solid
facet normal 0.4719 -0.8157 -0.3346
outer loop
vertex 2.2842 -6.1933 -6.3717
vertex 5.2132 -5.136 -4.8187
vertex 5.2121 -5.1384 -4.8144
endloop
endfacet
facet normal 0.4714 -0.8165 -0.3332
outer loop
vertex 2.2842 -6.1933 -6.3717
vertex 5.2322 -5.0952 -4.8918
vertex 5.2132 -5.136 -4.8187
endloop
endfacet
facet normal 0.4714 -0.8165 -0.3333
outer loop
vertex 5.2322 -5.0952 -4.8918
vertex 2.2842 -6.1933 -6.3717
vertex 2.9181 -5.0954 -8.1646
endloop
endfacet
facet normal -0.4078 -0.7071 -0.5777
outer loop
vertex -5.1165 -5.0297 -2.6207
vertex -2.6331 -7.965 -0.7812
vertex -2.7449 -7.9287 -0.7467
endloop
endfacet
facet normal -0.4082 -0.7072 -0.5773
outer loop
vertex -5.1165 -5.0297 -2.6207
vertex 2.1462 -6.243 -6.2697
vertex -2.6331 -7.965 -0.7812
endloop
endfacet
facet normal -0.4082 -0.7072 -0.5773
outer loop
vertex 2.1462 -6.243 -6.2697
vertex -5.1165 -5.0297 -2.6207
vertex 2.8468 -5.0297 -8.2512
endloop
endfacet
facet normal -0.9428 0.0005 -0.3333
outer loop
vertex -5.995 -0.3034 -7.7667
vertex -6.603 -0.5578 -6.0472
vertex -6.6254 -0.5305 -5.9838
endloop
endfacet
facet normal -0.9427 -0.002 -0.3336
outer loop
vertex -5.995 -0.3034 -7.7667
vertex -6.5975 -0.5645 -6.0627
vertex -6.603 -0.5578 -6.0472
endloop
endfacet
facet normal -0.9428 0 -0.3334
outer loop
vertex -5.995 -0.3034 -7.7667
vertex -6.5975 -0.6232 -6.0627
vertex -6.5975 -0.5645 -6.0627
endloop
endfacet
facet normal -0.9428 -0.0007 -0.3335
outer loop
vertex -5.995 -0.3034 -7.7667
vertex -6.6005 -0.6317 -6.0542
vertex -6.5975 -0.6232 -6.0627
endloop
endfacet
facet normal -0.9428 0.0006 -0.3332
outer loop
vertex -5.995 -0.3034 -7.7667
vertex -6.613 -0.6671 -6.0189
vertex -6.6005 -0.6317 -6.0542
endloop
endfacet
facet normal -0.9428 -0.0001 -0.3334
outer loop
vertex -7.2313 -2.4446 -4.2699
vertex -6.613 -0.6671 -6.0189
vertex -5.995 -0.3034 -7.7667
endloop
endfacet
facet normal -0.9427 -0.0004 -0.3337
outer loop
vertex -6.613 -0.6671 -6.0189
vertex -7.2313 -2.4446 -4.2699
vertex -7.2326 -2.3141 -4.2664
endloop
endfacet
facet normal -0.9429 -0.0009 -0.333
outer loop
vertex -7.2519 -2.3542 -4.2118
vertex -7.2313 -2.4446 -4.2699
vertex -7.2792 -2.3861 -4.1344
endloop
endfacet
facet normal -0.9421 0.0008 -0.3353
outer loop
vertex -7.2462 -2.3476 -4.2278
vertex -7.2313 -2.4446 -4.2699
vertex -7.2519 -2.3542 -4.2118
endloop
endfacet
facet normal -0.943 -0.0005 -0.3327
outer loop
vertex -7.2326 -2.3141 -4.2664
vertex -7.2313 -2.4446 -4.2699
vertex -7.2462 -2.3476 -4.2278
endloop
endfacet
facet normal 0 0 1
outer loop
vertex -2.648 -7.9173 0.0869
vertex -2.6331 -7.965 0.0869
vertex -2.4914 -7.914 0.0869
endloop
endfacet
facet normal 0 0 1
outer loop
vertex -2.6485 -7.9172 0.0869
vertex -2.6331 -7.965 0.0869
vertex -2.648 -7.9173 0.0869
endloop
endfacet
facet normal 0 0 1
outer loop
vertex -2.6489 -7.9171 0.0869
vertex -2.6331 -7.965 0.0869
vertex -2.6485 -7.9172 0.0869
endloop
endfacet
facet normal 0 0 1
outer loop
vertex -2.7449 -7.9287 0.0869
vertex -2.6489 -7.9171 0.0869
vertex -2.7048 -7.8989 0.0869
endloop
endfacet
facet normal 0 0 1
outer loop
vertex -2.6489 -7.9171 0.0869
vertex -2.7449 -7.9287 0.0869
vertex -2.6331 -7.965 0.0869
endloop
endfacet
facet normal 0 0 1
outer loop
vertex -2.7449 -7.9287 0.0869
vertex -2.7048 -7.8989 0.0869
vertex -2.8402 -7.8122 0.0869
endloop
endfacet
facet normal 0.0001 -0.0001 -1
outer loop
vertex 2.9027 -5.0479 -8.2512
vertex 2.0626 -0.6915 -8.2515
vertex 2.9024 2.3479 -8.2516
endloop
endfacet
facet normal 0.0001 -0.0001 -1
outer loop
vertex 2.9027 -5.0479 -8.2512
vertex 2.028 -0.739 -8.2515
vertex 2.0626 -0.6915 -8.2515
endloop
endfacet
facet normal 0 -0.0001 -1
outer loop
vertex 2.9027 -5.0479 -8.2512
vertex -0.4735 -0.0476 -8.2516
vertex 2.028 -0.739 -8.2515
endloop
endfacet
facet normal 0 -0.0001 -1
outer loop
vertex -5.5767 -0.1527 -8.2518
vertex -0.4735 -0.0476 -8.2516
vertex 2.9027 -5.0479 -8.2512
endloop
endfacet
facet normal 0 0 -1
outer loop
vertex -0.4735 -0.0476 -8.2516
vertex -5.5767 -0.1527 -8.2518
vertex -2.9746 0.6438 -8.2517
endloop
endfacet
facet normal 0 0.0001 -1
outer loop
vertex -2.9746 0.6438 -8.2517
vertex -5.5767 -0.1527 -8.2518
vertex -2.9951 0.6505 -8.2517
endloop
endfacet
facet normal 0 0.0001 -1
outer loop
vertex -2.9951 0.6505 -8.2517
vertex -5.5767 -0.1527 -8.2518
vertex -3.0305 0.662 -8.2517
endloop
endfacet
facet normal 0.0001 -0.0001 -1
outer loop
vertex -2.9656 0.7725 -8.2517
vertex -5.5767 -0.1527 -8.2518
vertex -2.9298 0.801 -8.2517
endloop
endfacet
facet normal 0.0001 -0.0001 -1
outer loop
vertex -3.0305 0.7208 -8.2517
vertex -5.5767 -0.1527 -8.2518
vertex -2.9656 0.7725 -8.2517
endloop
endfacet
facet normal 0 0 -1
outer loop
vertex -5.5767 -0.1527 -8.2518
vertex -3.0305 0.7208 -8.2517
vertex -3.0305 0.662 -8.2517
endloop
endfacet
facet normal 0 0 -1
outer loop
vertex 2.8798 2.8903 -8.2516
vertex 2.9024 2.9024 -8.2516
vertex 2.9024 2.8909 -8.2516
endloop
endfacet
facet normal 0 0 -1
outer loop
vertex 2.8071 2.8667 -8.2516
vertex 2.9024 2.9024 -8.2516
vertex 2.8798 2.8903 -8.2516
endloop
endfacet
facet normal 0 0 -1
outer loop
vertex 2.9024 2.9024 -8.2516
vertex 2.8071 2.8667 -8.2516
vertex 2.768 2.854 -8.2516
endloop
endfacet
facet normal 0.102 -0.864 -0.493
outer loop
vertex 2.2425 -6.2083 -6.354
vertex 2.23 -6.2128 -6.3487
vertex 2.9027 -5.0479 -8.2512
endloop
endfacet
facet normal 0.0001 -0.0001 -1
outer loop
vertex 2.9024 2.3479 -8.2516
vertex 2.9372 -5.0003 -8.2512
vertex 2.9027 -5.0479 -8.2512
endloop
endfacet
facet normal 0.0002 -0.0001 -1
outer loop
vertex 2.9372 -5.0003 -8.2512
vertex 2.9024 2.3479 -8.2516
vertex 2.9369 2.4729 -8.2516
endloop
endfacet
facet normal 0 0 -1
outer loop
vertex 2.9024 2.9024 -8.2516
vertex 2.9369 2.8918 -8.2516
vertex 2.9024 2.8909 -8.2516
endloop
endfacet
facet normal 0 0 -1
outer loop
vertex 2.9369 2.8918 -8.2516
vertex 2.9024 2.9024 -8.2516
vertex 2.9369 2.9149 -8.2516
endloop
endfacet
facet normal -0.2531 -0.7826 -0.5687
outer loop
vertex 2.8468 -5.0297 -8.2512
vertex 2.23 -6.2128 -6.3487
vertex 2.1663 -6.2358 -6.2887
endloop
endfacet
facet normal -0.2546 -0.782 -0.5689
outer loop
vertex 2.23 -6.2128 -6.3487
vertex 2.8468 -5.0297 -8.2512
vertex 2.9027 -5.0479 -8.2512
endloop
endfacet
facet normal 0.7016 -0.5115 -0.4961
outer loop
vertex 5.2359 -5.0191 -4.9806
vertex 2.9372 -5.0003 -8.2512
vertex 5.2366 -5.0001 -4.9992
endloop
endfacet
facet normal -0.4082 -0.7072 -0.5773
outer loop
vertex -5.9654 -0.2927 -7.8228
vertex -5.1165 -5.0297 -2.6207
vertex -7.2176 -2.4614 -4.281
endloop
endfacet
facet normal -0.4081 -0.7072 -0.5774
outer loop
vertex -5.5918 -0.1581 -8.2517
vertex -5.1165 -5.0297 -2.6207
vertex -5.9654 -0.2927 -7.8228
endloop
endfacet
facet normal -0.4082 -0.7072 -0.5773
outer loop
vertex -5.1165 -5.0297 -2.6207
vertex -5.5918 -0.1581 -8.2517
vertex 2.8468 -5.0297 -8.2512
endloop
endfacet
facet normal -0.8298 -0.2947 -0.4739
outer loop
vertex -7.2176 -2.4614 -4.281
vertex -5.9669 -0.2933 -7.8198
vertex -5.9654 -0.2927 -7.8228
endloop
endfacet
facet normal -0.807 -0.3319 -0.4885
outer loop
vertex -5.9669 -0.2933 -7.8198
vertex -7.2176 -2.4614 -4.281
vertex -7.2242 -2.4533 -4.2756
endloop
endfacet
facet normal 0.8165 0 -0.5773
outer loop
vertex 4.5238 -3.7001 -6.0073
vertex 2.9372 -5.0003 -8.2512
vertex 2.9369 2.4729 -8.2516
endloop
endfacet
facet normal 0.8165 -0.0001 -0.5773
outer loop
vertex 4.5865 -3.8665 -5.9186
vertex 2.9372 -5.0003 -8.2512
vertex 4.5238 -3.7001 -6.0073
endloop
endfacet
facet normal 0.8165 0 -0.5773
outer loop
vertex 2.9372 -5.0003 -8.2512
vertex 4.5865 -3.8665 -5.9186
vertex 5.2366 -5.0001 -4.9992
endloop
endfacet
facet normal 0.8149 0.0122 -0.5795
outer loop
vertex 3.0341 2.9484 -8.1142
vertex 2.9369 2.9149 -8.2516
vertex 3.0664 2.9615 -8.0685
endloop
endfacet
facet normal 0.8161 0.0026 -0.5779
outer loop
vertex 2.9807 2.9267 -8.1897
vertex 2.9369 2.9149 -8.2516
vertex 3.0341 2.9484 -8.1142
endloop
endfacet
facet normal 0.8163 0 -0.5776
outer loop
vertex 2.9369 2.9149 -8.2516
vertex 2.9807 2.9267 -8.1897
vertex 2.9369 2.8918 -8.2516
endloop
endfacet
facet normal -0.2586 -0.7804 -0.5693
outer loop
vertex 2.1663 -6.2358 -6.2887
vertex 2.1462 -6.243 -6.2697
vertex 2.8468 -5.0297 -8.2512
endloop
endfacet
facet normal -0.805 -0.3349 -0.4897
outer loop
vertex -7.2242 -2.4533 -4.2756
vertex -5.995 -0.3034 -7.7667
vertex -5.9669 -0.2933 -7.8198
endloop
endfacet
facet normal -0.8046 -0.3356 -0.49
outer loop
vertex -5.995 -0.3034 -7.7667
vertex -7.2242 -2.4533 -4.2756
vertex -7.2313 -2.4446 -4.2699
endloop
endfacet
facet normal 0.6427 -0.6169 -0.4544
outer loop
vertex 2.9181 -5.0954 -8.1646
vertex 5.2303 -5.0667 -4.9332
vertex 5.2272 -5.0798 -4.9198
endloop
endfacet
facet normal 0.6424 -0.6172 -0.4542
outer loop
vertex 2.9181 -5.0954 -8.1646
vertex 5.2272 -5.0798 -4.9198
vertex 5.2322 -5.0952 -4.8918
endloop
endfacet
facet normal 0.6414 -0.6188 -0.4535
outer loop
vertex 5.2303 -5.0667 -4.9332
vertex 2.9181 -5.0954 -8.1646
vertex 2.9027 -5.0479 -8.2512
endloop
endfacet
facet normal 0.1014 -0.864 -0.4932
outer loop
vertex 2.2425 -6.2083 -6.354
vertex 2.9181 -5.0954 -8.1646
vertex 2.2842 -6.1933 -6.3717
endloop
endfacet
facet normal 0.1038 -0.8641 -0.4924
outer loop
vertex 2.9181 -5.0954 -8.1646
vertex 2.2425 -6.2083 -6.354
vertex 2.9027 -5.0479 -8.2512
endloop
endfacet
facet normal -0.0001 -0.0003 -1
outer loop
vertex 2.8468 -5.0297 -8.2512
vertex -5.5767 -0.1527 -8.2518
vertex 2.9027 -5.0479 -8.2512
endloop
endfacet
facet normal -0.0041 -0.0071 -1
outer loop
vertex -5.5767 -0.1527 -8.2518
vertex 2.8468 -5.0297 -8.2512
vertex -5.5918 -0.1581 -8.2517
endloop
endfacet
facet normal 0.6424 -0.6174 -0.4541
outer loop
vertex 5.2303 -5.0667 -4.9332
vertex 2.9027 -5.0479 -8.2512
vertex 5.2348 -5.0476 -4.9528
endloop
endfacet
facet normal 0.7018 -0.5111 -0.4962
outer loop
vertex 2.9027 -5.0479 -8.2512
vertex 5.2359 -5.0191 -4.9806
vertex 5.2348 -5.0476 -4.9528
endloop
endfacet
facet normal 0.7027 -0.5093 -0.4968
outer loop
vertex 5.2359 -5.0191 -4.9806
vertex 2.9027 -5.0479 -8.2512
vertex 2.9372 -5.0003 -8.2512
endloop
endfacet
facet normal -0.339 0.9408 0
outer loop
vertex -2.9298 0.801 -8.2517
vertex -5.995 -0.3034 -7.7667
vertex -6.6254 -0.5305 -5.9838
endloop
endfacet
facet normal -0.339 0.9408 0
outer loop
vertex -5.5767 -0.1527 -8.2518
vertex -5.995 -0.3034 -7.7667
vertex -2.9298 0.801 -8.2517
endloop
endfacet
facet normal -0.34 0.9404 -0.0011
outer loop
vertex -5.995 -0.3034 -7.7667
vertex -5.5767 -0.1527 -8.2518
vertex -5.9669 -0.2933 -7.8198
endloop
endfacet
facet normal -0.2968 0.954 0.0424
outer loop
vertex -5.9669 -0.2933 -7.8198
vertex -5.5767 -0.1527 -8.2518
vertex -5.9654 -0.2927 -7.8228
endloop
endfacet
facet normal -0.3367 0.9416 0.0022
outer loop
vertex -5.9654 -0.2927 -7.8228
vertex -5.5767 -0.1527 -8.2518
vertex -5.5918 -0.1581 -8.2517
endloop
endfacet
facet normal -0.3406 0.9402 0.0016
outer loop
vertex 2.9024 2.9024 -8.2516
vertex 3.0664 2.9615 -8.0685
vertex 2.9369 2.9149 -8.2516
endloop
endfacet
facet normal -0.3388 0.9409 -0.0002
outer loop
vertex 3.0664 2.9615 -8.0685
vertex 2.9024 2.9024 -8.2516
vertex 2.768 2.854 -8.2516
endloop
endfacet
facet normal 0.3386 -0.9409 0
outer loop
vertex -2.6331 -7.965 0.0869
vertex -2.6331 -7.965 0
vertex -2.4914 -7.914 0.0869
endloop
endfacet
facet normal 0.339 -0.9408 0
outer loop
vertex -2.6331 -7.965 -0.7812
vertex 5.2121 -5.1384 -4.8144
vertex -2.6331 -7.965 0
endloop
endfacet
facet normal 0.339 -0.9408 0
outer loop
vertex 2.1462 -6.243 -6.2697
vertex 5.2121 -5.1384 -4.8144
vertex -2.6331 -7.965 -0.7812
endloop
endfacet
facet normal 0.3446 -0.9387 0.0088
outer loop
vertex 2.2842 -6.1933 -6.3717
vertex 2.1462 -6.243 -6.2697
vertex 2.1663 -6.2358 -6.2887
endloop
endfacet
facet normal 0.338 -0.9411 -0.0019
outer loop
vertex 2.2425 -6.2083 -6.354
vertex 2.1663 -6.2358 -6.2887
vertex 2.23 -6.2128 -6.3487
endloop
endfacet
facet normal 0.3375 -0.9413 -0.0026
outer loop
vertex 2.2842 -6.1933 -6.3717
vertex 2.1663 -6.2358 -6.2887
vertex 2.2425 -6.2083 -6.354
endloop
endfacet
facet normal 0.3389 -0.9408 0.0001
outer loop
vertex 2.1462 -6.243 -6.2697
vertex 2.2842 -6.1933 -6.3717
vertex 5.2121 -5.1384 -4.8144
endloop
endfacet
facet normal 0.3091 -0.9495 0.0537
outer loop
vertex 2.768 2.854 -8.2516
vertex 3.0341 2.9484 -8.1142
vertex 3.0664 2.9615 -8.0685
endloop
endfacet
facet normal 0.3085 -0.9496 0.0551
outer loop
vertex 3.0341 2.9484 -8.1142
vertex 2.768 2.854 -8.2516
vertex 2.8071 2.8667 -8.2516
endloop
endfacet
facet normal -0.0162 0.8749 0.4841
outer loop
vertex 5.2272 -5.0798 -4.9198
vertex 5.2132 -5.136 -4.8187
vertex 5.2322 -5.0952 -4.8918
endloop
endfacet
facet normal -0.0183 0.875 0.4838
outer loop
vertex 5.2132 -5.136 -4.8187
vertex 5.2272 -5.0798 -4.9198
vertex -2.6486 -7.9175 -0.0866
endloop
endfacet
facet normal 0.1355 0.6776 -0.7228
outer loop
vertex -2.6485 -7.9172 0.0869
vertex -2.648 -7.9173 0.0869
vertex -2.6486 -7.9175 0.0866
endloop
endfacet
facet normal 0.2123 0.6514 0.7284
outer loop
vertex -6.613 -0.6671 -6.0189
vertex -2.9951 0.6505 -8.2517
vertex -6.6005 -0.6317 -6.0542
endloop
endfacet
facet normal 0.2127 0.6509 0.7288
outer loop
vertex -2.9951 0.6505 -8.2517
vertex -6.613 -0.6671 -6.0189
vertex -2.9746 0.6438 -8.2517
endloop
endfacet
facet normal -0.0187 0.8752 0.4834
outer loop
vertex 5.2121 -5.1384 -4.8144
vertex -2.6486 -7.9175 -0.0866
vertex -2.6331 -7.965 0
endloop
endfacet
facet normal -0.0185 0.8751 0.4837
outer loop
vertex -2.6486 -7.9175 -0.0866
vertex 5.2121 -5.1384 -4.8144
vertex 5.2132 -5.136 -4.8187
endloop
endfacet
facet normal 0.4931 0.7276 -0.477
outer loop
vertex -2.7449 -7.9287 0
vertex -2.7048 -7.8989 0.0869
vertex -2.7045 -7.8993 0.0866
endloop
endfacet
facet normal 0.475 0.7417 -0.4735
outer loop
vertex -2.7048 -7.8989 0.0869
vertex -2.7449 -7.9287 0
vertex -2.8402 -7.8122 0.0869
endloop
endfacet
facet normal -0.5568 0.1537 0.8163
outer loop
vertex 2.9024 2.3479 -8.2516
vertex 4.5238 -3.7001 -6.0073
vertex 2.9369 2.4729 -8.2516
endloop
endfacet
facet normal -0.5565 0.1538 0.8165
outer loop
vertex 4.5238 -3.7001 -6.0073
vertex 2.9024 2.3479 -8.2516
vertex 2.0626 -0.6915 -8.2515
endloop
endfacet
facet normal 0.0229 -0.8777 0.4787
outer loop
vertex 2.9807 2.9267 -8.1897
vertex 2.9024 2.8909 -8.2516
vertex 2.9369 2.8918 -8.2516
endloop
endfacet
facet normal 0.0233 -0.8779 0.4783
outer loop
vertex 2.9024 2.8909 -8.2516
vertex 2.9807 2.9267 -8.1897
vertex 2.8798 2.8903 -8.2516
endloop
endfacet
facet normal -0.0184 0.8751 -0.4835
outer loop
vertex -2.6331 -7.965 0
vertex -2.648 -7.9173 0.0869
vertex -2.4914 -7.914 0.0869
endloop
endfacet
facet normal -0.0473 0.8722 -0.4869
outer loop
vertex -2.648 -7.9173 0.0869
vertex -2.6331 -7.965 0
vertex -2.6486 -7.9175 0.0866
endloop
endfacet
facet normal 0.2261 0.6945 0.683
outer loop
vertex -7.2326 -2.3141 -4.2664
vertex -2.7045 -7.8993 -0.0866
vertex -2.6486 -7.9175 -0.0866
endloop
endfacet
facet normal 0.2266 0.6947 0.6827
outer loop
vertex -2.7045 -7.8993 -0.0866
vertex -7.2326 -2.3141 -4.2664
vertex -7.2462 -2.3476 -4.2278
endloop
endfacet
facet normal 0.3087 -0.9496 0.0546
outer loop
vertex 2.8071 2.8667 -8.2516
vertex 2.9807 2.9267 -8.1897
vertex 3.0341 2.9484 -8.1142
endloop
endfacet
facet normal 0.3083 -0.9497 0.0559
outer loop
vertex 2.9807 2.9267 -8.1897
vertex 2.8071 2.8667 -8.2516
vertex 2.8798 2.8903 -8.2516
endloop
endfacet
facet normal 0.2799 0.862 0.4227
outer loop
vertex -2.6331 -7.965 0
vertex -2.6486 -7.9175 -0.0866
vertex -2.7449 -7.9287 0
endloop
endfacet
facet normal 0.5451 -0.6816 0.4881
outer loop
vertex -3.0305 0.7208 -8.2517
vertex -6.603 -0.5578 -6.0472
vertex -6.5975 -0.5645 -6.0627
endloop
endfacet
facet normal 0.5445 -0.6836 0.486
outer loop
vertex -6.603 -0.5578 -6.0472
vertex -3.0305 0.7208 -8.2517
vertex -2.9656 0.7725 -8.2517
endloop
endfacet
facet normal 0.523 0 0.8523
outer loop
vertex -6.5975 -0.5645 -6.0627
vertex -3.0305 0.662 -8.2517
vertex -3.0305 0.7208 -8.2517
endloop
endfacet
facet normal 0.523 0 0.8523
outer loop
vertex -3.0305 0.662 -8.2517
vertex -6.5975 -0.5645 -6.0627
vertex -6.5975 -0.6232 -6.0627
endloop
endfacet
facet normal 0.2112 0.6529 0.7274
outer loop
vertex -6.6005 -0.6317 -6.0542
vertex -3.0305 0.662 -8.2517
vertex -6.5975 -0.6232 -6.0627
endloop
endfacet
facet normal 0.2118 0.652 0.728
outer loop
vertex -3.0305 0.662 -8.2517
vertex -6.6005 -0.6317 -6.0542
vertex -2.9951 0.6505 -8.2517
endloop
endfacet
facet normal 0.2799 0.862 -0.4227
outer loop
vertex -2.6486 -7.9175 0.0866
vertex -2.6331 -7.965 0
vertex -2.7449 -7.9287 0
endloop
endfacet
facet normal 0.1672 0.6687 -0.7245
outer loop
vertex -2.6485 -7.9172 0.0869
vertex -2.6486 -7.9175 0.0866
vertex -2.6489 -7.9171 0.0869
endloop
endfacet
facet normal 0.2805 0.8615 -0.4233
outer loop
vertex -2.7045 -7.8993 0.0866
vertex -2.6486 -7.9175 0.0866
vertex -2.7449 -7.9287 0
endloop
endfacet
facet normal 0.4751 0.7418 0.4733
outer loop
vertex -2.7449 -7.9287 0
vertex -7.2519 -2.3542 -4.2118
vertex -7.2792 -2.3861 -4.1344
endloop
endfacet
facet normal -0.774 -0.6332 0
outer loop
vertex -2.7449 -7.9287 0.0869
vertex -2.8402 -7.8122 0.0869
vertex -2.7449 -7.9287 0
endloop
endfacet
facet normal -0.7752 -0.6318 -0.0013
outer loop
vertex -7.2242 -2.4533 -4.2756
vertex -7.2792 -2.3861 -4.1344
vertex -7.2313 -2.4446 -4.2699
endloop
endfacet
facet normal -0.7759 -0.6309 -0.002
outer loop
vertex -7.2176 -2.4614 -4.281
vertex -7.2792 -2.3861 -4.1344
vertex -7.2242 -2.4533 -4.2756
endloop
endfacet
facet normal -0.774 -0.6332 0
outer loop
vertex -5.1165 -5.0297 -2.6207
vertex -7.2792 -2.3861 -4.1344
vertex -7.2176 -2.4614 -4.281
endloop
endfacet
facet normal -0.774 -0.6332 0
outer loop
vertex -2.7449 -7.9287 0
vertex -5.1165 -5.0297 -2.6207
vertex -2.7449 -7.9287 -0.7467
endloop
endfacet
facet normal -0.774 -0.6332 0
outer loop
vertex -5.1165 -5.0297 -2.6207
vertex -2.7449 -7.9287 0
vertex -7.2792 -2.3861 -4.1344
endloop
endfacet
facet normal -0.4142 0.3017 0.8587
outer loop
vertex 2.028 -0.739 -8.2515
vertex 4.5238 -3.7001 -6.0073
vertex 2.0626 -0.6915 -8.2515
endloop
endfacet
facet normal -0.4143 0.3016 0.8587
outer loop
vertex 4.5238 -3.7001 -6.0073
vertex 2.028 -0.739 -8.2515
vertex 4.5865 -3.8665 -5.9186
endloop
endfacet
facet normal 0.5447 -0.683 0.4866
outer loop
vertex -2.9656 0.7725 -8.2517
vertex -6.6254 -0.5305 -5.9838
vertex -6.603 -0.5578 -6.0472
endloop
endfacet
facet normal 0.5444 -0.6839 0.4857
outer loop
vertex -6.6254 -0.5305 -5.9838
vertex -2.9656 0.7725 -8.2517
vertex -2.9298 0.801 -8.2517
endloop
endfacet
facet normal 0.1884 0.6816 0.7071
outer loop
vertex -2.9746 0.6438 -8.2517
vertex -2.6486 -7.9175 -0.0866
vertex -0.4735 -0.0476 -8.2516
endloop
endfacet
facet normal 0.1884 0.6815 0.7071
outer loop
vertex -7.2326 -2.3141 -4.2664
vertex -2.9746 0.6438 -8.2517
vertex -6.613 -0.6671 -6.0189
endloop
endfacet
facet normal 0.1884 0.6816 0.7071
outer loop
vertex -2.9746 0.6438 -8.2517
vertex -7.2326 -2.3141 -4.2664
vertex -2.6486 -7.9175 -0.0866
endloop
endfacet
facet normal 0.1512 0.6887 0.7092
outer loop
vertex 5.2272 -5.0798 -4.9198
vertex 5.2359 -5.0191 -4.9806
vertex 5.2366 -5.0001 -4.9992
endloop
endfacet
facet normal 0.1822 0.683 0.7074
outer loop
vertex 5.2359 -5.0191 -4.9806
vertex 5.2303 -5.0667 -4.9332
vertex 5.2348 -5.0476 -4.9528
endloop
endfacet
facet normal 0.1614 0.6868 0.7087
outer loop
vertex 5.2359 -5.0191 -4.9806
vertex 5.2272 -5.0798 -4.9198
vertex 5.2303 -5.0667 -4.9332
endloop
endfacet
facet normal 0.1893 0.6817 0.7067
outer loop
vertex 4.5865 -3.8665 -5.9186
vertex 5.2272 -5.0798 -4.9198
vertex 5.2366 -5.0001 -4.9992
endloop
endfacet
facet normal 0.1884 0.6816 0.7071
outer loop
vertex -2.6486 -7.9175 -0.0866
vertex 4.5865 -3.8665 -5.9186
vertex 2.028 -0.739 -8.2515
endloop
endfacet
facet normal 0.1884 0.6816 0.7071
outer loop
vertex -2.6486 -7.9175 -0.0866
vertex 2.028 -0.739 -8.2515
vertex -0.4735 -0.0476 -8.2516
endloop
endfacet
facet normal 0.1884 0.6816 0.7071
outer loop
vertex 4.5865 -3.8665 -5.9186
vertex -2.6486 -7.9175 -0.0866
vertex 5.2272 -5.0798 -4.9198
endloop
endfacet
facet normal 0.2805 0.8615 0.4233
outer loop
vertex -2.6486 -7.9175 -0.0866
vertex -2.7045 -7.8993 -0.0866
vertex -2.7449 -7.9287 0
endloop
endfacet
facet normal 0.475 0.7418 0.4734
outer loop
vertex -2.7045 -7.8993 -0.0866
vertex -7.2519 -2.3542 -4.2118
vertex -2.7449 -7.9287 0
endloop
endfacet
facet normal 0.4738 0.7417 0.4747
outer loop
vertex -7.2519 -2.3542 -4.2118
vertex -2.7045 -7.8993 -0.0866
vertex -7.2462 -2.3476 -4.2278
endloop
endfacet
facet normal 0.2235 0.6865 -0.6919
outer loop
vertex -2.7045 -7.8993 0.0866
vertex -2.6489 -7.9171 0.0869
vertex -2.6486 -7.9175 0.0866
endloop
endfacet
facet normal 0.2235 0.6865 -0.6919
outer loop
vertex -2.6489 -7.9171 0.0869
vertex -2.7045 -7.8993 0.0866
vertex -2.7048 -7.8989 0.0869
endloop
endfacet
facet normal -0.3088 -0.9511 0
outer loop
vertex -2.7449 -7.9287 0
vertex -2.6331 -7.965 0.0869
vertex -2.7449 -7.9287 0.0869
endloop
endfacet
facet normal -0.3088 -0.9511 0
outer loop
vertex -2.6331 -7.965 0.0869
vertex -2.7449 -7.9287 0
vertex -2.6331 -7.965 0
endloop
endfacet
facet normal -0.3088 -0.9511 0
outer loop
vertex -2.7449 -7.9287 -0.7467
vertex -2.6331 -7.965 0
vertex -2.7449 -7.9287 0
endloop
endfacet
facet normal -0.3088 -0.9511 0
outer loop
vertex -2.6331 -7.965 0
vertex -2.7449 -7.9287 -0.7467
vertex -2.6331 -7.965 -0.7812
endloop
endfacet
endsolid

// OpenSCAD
// Auto-generated OpenSCAD file

    inner_points = 10*[[0.5483513328711939, -0.49343059621073404, 0.5000000000001427], [-0.8147584849794822, -0.1166924584026583, 0.5000000000000114], [0.8147454248469246, 0.4704335994932656, -0.5000000000000114], [-0.2664006220419612, -0.7869936251588691, 1.539879335155092e-13], [-6.530066327234646e-06, 0.17687057054547678, 1.0], [-6.5300662304823955e-06, 0.1768705705451305, -1.0], [0.5483513328712422, -0.4934305962109071, -0.4999999999998575], [-0.8147584849794339, -0.11669245840283138, -0.4999999999999886], [0.8147454248468763, 0.47043359949343866, 0.4999999999999886]];

    outer_points = 10*[[0.2886841223116632, 0.4999680237807507, -0.8165129838048599], [0.8660438627157157, -0.4999680237807507, 5.5219683157359256e-05], [-0.8660438627157157, 0.4999680237807507, -5.5219683157359256e-05], [0.2887210423333781, -0.5000319741744229, -0.8164607672859469], [0.8660069426940007, 0.5000319741744229, 3.0031642442862605e-06], [-0.8660069426940007, -0.5000319741744229, -3.0031642442862605e-06], [-0.5773228203823376, -6.395039367218525e-05, -0.8165159869691043], [3.692002171488182e-05, -0.9999999979551737, 5.221651891308081e-05], [-3.692002171488182e-05, 0.9999999979551737, -5.221651891308081e-05]];

    // Convex hull for inner set (I)
    module inner_hull() {
        hull() {
            for (p = inner_points) {
                translate(p) sphere(r=0.1);
            }
        }
    }

    // Convex hull for outer set (O) minus inner hull (O \ I)
    module outer_minus_inner() {
        difference() {
            hull() {
                for (p = outer_points) {
                    translate(p) sphere(r=0.1);
                }
            }
            inner_hull(); // Subtract inner hull
        }
    }

    // Convex hull for outer set (O) minus all translated inner hulls
    module outer_minus_AllTranslationInner() {
        difference() {
            hull() {
                for (p = outer_points) {
                    translate(p) sphere(r=0.1);
                }
            }
            hull() {
                translate([0,0,50]) inner_hull();
                translate([0,0,-50]) inner_hull();
            }; // Subtract translated inner hulls
        }
    }

    // Difference between outer_minus_inner and outer_minus_AllTranslationInner
    module outer_minus_inner_diff() {
        difference() {
            // Outer minus inner
            difference() {
                hull() {
                    for (p = outer_points) {
                        translate(p) sphere(r=0.1);
                    }
                }
                inner_hull();
            }

            // Subtract Outer minus AllTranslationInner
            difference() {
                hull() {
                    for (p = outer_points) {
                        translate(p) sphere(r=0.1);
                    }
                }
                hull() {
                    translate([0,0,50]) inner_hull();
                    translate([0,0,-50]) inner_hull();
                };
            }
        }
    }

    // Rendering all with colors applied
    color([1, 1, 0, 1]) outer_minus_inner_diff(); // Opaque yellow
    
